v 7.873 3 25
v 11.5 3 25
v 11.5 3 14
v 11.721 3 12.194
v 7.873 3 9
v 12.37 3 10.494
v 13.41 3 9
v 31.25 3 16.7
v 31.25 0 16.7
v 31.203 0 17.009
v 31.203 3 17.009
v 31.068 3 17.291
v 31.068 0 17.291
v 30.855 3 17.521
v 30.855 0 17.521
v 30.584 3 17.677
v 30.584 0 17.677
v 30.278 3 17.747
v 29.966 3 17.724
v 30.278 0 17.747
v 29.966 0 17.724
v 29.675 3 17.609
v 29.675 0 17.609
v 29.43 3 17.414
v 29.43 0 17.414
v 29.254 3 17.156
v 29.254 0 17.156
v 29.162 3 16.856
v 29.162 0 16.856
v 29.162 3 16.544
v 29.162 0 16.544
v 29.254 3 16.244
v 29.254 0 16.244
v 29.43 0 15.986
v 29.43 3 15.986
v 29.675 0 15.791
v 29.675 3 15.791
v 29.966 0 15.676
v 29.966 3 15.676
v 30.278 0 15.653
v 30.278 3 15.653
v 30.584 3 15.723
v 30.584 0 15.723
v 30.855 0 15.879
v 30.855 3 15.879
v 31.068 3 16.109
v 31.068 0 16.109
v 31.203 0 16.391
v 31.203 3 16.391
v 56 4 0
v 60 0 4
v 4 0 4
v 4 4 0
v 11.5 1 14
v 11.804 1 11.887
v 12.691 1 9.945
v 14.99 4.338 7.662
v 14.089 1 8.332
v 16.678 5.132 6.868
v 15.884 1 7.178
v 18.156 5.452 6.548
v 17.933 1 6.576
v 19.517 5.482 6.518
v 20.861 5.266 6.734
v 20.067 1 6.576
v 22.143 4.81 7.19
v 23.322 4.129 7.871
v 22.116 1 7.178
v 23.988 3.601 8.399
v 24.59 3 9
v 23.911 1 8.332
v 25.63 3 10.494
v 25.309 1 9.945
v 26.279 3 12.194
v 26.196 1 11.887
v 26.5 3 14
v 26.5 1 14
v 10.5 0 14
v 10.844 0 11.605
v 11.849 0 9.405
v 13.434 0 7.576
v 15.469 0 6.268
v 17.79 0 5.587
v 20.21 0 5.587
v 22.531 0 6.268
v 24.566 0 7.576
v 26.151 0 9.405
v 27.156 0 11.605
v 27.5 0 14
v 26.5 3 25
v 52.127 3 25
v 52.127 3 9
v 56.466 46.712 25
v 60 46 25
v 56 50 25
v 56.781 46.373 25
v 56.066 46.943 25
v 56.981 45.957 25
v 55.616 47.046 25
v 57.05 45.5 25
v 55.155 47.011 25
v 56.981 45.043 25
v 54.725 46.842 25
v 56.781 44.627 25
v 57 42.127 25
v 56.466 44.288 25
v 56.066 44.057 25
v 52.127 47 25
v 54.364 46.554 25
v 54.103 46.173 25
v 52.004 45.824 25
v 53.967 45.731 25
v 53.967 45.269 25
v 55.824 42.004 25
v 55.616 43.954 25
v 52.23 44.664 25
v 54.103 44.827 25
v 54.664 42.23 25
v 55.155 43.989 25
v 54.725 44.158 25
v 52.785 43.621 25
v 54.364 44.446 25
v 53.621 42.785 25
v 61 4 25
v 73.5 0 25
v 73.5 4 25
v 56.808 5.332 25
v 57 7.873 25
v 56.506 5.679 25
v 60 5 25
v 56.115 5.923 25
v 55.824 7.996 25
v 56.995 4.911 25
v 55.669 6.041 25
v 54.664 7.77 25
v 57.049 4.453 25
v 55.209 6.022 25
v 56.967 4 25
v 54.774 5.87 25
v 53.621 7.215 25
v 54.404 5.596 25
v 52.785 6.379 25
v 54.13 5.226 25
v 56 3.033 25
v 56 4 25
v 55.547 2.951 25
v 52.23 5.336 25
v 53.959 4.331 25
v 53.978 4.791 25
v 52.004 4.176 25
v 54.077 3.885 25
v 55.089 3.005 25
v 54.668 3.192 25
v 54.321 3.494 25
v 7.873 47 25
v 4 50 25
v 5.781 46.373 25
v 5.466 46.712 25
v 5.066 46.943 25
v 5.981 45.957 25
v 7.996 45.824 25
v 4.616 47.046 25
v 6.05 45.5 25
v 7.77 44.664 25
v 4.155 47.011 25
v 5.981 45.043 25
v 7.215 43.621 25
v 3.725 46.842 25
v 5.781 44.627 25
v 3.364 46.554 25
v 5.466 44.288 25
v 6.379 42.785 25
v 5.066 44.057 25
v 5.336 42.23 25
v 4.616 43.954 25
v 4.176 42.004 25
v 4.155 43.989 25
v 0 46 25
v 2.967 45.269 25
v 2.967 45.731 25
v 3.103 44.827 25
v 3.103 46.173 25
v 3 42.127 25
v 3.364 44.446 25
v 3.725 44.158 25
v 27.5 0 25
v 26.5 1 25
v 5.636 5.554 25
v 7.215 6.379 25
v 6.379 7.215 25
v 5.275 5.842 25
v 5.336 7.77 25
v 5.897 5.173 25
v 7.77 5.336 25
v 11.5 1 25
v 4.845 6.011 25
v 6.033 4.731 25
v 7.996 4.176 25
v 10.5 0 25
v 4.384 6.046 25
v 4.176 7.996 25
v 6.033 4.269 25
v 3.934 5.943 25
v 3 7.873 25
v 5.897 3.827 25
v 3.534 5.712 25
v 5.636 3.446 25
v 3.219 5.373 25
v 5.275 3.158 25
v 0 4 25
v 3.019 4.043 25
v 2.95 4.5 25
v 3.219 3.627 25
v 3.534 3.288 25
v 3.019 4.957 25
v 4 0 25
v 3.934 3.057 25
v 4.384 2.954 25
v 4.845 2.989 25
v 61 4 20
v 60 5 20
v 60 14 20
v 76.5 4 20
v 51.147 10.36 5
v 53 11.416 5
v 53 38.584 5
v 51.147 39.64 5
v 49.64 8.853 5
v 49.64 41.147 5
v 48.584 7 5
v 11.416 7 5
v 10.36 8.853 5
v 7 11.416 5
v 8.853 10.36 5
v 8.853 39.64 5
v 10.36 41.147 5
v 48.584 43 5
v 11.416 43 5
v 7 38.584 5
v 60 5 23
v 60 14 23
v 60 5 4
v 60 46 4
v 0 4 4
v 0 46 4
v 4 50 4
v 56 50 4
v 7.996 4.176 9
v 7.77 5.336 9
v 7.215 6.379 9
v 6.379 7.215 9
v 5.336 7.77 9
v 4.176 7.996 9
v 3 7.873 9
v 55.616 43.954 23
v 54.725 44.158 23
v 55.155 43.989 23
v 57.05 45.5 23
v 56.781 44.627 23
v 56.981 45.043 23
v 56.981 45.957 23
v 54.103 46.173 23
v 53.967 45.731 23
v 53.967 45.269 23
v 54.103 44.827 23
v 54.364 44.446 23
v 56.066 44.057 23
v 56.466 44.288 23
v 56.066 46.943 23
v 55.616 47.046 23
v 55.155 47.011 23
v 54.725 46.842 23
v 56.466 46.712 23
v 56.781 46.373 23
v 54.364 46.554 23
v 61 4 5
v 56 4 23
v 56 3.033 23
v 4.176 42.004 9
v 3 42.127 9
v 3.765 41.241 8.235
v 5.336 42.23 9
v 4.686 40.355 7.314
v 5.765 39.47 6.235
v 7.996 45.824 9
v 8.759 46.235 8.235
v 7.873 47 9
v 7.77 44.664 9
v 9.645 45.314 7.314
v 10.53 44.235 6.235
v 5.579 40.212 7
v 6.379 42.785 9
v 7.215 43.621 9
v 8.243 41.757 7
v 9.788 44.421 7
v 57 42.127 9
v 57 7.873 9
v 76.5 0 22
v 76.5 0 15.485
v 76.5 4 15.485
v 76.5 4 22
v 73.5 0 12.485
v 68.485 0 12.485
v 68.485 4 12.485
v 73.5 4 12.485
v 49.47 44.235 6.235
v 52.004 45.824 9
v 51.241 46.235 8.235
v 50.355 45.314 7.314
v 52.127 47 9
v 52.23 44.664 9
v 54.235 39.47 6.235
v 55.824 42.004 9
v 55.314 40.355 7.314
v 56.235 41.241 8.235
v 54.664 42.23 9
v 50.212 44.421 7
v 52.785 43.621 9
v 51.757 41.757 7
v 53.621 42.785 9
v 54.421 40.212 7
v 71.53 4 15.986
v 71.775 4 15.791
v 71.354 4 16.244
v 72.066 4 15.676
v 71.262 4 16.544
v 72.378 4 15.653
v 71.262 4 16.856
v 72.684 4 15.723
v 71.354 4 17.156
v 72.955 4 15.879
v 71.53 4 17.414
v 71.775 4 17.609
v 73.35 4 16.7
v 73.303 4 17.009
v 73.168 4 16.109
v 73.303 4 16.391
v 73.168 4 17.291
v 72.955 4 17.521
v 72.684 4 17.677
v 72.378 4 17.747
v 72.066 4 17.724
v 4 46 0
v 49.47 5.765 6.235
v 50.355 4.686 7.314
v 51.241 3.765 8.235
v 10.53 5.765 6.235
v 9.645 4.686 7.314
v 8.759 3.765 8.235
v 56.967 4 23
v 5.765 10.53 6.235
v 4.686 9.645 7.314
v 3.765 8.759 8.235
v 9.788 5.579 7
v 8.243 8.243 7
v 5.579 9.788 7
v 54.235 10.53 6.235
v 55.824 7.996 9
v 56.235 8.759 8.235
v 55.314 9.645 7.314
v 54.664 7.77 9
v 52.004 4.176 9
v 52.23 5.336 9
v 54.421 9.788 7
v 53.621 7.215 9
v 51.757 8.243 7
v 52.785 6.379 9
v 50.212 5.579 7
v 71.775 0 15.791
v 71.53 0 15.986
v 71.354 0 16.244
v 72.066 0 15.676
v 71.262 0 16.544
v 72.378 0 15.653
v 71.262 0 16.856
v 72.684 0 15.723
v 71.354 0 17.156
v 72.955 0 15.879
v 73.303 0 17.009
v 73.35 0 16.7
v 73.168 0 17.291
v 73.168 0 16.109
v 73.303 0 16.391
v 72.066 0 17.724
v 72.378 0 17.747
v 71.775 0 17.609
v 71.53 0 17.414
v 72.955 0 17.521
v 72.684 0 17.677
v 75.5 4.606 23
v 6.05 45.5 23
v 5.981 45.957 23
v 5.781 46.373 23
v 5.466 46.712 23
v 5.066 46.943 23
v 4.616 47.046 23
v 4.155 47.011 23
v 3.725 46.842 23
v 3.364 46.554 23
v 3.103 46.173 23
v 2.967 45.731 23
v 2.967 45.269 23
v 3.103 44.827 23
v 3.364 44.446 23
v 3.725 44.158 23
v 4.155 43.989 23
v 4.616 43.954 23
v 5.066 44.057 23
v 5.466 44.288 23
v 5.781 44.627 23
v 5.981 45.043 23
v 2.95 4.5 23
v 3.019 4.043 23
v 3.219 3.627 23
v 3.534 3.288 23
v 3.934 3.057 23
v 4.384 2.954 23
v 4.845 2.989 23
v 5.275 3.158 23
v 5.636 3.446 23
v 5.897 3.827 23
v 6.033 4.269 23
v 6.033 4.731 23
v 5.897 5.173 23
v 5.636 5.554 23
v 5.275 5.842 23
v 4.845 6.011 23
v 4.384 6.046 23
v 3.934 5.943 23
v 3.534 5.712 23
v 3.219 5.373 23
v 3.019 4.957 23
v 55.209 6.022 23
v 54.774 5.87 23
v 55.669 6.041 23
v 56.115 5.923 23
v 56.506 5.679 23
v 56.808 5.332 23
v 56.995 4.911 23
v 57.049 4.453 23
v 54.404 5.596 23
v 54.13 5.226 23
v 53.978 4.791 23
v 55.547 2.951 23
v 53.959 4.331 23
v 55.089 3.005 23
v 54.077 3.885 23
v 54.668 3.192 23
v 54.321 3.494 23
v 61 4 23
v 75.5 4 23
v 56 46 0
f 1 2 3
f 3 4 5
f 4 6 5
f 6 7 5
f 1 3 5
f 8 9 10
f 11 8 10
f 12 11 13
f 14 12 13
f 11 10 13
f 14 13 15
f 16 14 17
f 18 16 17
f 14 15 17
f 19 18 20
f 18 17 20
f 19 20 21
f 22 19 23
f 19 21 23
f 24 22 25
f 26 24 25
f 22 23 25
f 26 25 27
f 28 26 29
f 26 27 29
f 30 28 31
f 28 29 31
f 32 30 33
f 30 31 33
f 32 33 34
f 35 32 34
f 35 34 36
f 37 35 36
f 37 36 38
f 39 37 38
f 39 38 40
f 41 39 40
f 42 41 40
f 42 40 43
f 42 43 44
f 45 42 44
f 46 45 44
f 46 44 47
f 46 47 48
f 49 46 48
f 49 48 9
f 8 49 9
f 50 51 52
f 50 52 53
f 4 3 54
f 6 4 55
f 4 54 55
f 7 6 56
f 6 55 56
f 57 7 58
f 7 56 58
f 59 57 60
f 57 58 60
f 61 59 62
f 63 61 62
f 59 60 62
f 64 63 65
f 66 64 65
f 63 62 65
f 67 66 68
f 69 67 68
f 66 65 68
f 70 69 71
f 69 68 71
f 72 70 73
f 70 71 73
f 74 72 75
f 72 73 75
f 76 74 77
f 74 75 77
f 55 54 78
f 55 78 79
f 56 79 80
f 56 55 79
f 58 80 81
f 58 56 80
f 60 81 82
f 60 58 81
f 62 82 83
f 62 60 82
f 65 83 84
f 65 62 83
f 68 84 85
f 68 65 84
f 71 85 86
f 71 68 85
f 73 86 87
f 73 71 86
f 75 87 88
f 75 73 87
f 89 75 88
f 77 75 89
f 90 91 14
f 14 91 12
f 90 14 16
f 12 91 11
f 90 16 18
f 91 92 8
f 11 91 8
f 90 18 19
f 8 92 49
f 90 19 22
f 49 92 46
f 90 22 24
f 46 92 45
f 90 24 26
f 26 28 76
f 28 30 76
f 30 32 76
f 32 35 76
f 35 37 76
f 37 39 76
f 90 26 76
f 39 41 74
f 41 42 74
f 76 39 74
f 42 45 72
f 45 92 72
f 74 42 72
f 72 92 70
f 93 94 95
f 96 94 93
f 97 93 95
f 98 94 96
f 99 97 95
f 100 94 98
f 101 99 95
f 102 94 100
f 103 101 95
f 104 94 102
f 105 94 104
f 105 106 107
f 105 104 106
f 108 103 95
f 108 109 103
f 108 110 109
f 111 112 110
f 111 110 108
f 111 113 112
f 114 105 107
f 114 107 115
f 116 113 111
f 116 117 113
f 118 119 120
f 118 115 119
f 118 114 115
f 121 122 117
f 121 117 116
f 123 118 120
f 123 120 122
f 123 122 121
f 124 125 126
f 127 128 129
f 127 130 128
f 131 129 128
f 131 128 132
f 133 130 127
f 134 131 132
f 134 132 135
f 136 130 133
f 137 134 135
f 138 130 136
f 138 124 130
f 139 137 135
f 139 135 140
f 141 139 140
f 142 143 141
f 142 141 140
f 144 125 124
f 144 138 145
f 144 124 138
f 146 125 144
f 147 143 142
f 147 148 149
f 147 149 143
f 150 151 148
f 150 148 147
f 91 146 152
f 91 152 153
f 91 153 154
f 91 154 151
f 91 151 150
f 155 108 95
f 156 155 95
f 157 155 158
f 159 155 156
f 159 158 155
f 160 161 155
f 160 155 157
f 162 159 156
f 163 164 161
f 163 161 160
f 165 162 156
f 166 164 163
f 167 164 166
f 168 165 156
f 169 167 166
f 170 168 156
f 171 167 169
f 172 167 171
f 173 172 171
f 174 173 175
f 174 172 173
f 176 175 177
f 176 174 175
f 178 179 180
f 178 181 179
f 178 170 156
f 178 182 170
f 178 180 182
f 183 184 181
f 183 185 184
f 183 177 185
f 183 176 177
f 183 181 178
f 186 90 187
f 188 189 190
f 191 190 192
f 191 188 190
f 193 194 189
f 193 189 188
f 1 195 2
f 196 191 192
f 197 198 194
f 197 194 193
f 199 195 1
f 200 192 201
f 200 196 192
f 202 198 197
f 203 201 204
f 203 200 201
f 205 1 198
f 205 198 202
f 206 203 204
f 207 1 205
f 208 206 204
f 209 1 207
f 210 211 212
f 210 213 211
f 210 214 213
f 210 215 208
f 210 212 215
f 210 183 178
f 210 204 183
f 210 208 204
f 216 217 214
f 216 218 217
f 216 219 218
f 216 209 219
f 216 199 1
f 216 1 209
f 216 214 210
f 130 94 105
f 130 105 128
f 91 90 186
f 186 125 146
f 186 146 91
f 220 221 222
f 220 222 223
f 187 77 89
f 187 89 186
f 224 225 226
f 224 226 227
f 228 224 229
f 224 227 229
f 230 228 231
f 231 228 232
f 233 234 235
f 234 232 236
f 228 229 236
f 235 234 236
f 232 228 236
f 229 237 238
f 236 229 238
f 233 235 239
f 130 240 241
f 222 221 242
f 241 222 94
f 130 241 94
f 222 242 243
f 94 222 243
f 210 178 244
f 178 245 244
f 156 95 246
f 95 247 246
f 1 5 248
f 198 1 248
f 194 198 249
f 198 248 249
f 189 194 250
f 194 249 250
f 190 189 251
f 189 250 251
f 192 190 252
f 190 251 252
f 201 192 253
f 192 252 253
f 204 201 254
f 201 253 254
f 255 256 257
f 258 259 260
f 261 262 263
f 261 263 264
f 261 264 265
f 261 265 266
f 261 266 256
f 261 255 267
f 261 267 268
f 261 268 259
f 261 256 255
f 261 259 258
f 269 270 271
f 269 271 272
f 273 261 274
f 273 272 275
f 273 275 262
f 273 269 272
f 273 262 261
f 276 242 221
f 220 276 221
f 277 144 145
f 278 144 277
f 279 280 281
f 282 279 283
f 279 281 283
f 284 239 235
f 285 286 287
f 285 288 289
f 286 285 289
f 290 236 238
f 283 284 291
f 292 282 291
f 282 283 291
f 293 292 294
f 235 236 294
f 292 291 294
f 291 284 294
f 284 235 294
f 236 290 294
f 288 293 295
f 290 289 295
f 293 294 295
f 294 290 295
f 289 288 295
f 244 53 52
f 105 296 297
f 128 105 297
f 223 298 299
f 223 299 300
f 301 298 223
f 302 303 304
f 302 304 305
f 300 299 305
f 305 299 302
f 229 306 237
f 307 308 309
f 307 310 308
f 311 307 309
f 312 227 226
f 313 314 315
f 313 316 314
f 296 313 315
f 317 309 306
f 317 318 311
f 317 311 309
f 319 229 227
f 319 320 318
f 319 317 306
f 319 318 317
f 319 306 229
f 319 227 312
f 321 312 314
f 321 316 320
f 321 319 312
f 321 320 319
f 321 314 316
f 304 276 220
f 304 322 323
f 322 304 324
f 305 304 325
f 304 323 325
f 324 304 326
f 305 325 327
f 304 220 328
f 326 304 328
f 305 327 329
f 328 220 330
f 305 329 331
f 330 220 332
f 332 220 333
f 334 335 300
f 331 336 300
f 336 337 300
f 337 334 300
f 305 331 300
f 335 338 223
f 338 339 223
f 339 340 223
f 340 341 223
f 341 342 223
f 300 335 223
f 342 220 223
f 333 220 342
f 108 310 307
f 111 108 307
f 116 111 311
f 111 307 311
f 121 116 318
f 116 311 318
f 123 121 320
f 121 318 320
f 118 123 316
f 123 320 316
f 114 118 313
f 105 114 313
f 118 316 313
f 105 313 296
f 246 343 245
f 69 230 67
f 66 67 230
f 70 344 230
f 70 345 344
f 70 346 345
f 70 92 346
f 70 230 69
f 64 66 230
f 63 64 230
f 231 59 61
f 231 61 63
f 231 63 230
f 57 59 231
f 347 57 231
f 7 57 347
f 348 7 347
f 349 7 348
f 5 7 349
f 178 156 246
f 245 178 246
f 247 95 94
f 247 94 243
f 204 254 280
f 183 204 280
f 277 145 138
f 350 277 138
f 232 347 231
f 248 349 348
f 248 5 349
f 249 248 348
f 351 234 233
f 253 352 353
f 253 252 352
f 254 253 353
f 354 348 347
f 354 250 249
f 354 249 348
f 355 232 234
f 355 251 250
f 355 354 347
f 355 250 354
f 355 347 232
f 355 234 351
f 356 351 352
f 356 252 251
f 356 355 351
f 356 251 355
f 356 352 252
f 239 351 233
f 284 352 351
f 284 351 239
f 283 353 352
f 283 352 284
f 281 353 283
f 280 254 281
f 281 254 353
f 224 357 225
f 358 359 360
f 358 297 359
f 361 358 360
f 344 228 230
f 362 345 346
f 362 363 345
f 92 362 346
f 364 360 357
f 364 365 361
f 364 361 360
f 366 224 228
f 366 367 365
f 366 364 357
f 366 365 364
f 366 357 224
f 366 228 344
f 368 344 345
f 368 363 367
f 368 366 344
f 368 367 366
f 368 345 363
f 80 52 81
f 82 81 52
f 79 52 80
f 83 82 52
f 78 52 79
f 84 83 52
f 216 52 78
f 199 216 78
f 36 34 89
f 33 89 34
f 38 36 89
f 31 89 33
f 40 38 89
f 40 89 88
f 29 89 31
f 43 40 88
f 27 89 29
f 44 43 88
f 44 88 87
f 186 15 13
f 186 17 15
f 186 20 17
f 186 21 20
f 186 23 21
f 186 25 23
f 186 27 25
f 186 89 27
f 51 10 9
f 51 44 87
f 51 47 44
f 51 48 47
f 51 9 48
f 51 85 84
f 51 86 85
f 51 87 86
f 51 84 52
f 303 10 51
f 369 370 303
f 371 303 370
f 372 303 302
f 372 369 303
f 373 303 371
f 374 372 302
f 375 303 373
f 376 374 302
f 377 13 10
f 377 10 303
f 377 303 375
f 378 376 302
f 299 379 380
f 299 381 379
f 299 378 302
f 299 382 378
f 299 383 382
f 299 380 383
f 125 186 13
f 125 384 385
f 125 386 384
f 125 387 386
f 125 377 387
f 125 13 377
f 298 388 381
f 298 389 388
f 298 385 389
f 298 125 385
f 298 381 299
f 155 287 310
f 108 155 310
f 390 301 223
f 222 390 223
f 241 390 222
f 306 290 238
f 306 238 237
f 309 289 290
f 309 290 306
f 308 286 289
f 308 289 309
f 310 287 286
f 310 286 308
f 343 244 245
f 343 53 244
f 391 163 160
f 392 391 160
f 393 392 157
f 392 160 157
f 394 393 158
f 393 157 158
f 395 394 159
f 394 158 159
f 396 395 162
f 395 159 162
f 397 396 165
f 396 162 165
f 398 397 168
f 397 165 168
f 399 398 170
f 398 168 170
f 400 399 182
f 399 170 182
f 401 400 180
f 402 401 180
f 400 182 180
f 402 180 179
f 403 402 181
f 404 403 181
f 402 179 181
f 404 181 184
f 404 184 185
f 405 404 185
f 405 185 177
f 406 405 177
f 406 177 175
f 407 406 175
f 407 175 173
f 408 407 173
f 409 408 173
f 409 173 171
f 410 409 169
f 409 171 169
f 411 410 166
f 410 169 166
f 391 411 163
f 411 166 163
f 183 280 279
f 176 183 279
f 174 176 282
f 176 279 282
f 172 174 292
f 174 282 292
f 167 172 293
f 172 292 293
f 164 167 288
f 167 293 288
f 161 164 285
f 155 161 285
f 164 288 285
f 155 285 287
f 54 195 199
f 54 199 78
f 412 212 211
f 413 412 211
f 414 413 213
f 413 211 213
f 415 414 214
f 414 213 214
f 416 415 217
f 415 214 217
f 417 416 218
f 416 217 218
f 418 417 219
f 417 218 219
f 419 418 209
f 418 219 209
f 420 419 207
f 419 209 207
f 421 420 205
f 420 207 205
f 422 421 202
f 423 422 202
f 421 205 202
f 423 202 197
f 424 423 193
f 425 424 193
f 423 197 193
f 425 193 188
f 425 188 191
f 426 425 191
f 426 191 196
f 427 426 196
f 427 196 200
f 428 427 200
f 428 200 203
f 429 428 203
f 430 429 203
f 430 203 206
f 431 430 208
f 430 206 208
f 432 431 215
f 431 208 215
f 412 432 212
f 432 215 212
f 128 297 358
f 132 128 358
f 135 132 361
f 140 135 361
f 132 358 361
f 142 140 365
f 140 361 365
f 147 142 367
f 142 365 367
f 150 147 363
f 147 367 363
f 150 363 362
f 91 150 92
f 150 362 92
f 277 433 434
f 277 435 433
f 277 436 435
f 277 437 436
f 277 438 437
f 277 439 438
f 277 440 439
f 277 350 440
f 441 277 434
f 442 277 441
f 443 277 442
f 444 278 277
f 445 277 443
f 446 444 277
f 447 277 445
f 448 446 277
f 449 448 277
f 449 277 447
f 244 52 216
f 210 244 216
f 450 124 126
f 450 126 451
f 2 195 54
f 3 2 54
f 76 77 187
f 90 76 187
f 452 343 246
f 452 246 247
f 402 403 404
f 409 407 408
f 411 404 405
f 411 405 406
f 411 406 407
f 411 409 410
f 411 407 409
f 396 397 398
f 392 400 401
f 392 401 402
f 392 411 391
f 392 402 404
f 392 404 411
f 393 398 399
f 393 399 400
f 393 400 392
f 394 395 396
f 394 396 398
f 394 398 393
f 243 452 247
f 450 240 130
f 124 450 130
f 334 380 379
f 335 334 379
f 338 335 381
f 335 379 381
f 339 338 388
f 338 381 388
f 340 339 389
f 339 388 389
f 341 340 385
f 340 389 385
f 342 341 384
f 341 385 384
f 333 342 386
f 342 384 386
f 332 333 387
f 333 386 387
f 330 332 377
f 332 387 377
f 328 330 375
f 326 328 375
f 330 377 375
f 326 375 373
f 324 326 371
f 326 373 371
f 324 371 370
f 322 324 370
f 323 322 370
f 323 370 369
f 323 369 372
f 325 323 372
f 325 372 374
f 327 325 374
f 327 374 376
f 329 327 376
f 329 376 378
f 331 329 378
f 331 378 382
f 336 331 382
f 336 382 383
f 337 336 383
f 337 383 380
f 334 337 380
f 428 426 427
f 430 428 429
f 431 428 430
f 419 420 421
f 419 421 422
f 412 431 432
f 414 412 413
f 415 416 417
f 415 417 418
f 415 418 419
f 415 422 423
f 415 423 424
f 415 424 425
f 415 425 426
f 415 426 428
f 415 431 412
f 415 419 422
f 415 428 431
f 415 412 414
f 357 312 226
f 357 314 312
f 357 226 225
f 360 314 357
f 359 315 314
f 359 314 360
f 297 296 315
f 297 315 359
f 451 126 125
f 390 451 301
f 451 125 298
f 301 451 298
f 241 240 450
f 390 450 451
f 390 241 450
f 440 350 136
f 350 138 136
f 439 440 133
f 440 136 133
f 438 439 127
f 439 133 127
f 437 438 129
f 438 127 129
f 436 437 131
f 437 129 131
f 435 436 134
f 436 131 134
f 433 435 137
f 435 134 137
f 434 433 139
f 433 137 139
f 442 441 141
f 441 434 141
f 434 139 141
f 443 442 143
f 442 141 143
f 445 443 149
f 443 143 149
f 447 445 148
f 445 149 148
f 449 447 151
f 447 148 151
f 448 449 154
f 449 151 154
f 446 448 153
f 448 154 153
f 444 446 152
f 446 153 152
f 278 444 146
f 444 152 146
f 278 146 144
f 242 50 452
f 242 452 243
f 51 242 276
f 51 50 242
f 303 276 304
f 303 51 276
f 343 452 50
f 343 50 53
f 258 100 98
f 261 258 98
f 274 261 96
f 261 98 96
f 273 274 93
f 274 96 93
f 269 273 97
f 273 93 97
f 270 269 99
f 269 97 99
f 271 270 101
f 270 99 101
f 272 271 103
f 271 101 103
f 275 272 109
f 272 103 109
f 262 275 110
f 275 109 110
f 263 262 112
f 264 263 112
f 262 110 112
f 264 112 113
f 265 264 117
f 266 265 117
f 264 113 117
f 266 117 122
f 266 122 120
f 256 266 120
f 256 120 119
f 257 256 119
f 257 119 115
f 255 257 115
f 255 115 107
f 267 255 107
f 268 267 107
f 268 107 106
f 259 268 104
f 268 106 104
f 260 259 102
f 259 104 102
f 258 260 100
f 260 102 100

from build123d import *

# Parameters (mm, degrees)
BOSS_EXTRUDE1_DEPTH = 5
BOSS_EXTRUDE2_DEPTH = 20
CHAMFER1_SIZE       = 4
CHAMFER2_SIZE       = 4
CUT_EXTRUDE1_REACH  = 84.006
SKETCH3_R           = 7.5
SKETCH5_R           = 1.550000000000001
SKETCH5_R_2         = 1.5500000000000018
SKETCH5_R_3         = 1.5500000000000012
SKETCH5_R_4         = 1.5500000000000003
CUT_EXTRUDE2_DEPTH  = 2
CHAMFER3_SIZE       = 1
BOSS_EXTRUDE3_DEPTH = 4
CUT_EXTRUDE3_REACH  = 81.126
CUT_EXTRUDE5_REACH  = 96.748
SKETCH10_R          = 1.050000000000002
SKETCH10_R_2        = 1.0499999999999956
BOSS_EXTRUDE5_DEPTH = 3
CHAMFER6_SIZE       = 1
CHAMFER7_SIZE       = 3


with BuildPart() as part:
    # Sketch1 → Boss-Extrude1 (new body)
    with BuildSketch(Plane.XY):
        Polygon((0, 0), (3.28e-15, 50), (60, 50), (60, -1.4e-16), align=None)
    extrude(amount=BOSS_EXTRUDE1_DEPTH)

    # Sketch2 → Boss-Extrude2 (add)
    with BuildSketch(Plane.XY.offset(5)):
        with BuildLine():
            Line((7.872983346207448, 47), (52.127016653792545, 47))
            ThreePointArc((52.12701665379256, 46.99999999999996), (53.55051025721673, 49.16227766016832), (55.99999999999984, 50.00000000000001))
            Line((55.99999999999984, 50), (3.9999999999998224, 50))
            ThreePointArc((3.999999999999821, 50), (6.449489742783131, 49.16227766016842), (7.872983346207436, 46.99999999999996))
        make_face()
        with BuildLine():
            ThreePointArc((0, 46), (1.1715728752537458, 48.82842712474613), (3.999999999999821, 50))
            Line((3.9999999999998224, 50), (0, 50))
            Line((3.28e-15, 50), (3.02e-15, 46))
        make_face()
        with BuildLine():
            ThreePointArc((8.000000000000007, 46), (7.968118785068677, 46.50401716993089), (7.872983346207436, 46.99999999999996))
            Line((7.872983346207448, 47), (3.000000000000007, 47))
            Line((3.0000000000000036, 47), (3.000000000000003, 42.12701665379265))
            ThreePointArc((2.999999999999857, 42.127016653792616), (6.4494897427831255, 42.83772233983157), (8.000000000000007, 46))
        make_face()
        with BuildLine():
            Line((3.000000000000007, 47), (7.872983346207448, 47))
            ThreePointArc((7.872983346207436, 46.99999999999996), (6.449489742783131, 49.16227766016842), (3.999999999999821, 50))
            ThreePointArc((3.999999999999821, 50), (1.1715728752537458, 48.82842712474613), (0, 46))
            ThreePointArc((0, 46), (0.8377223398315752, 43.55051025721688), (2.999999999999857, 42.127016653792616))
            Line((3.000000000000003, 42.12701665379265), (3.0000000000000036, 47))
        make_face()
        with BuildLine():
            ThreePointArc((-1.78e-15, 3.9999999936735127), (0.8377223378945806, 6.449489740282477), (3.0000000000001434, 7.8729833462074605))
            Line((3.000000000000001, 7.872983346207491), (3.000000000000003, 42.12701665379265))
            ThreePointArc((2.999999999999857, 42.127016653792616), (0.8377223398315752, 43.55051025721688), (0, 46))
            Line((3.02e-15, 46), (2.6e-16, 3.999999993673512))
        make_face()
        with BuildLine():
            ThreePointArc((8.000000000000007, 46), (7.968118785068677, 46.50401716993089), (7.872983346207436, 46.99999999999996))
            Line((7.872983346207448, 47), (3.000000000000007, 47))
            Line((3.0000000000000036, 47), (3.000000000000003, 42.12701665379265))
            ThreePointArc((2.999999999999857, 42.127016653792616), (6.4494897427831255, 42.83772233983157), (8.000000000000007, 46))
        make_face()
        with BuildLine():
            Line((3.000000000000007, 47), (7.872983346207448, 47))
            ThreePointArc((7.872983346207436, 46.99999999999996), (6.449489742783131, 49.16227766016842), (3.999999999999821, 50))
            ThreePointArc((3.999999999999821, 50), (1.1715728752537458, 48.82842712474613), (0, 46))
            ThreePointArc((0, 46), (0.8377223398315752, 43.55051025721688), (2.999999999999857, 42.127016653792616))
            Line((3.000000000000003, 42.12701665379265), (3.0000000000000036, 47))
        make_face()
        with BuildLine():
            ThreePointArc((3.999999999999755, 8.9e-16), (6.449489742783102, 0.8377223398315614), (7.872983346207432, 3.0000000000000497))
            Line((7.8729833462074446, 3), (3.0000000000000004, 3))
            Line((3.0000000000000004, 3), (3.000000000000001, 7.872983346207491))
            ThreePointArc((3.0000000000001434, 7.8729833462074605), (0.8377223378945806, 6.449489740282477), (-1.78e-15, 3.9999999936735127))
            ThreePointArc((-1.78e-15, 3.9999999936735127), (1.1715728774904743, 1.1715728730171464), (3.999999999999755, 8.9e-16))
        make_face()
        with BuildLine():
            Line((3.0000000000000004, 3), (7.8729833462074446, 3))
            ThreePointArc((7.872983346207432, 3.0000000000000497), (7.968118785068674, 3.4959828300691127), (8.000000000000004, 4.000000000000003))
            ThreePointArc((8.000000000000004, 4.0000000000000036), (6.449489742783239, 7.16227766016834), (3.0000000000001434, 7.8729833462074605))
            Line((3.000000000000001, 7.872983346207491), (3.0000000000000004, 3))
        make_face()
        with BuildLine():
            Line((0, 0), (3.999999999999755, -1e-17))
            ThreePointArc((3.999999999999755, 8.9e-16), (1.1715728774904743, 1.1715728730171464), (-1.78e-15, 3.9999999936735127))
            Line((2.6e-16, 3.999999993673512), (0, 0))
        make_face()
        with BuildLine():
            ThreePointArc((55.99999999999975, -1.066e-14), (53.55051025721669, 0.8377223398317017), (52.12701665379255, 3.0000000000000497))
            Line((52.12701665379255, 3), (7.8729833462074446, 3))
            ThreePointArc((7.872983346207432, 3.0000000000000497), (6.449489742783102, 0.8377223398315614), (3.999999999999755, 8.9e-16))
            Line((3.999999999999755, -1e-17), (55.99999999999976, -1.3e-16))
        make_face()
        with BuildLine():
            ThreePointArc((3.999999999999755, 8.9e-16), (6.449489742783102, 0.8377223398315614), (7.872983346207432, 3.0000000000000497))
            Line((7.8729833462074446, 3), (3.0000000000000004, 3))
            Line((3.0000000000000004, 3), (3.000000000000001, 7.872983346207491))
            ThreePointArc((3.0000000000001434, 7.8729833462074605), (0.8377223378945806, 6.449489740282477), (-1.78e-15, 3.9999999936735127))
            ThreePointArc((-1.78e-15, 3.9999999936735127), (1.1715728774904743, 1.1715728730171464), (3.999999999999755, 8.9e-16))
        make_face()
        with BuildLine():
            Line((3.0000000000000004, 3), (7.8729833462074446, 3))
            ThreePointArc((7.872983346207432, 3.0000000000000497), (7.968118785068674, 3.4959828300691127), (8.000000000000004, 4.000000000000003))
            ThreePointArc((8.000000000000004, 4.0000000000000036), (6.449489742783239, 7.16227766016834), (3.0000000000001434, 7.8729833462074605))
            Line((3.000000000000001, 7.872983346207491), (3.0000000000000004, 3))
        make_face()
        with BuildLine():
            Line((52.127016653792545, 3), (56.99999999999999, 3))
            Line((56.99999999999999, 3), (56.99999999999999, 7.872983346207451))
            ThreePointArc((56.99999999999993, 7.872983346207436), (53.171572875253794, 6.828427124746189), (52.12701665379255, 3.0000000000000497))
        make_face()
        with BuildLine():
            Line((56.99999999999999, 7.872983346207451), (56.99999999999999, 3))
            Line((56.99999999999999, 3), (52.127016653792545, 3))
            ThreePointArc((52.12701665379255, 3.0000000000000497), (53.55051025721669, 0.8377223398317017), (55.99999999999975, -1.066e-14))
            ThreePointArc((55.99999999999975, -1.066e-14), (58.8284271247461, 1.1715728752537156), (60, 3.9999999999999956))
            ThreePointArc((60, 3.9999999999999964), (59.16227766016836, 6.4494897427832045), (56.99999999999993, 7.872983346207436))
        make_face()
        with BuildLine():
            Line((60, -1.4e-16), (60, 3.9999999999999964))
            ThreePointArc((60, 3.9999999999999956), (58.8284271247461, 1.1715728752537156), (55.99999999999975, -1.066e-14))
            Line((55.99999999999975, -1.3e-16), (60, -1.4e-16))
        make_face()
        with BuildLine():
            Line((52.127016653792545, 3), (56.99999999999999, 3))
            Line((56.99999999999999, 3), (56.99999999999999, 7.872983346207451))
            ThreePointArc((56.99999999999993, 7.872983346207436), (53.171572875253794, 6.828427124746189), (52.12701665379255, 3.0000000000000497))
        make_face()
        with BuildLine():
            Line((56.99999999999999, 7.872983346207451), (56.99999999999999, 3))
            Line((56.99999999999999, 3), (52.127016653792545, 3))
            ThreePointArc((52.12701665379255, 3.0000000000000497), (53.55051025721669, 0.8377223398317017), (55.99999999999975, -1.066e-14))
            ThreePointArc((55.99999999999975, -1.066e-14), (58.8284271247461, 1.1715728752537156), (60, 3.9999999999999956))
            ThreePointArc((60, 3.9999999999999964), (59.16227766016836, 6.4494897427832045), (56.99999999999993, 7.872983346207436))
        make_face()
        with BuildLine():
            Line((56.99999999999999, 42.127016653792545), (56.99999999999999, 7.872983346207451))
            ThreePointArc((56.99999999999993, 7.872983346207436), (59.16227766016836, 6.4494897427832045), (60, 3.9999999999999964))
            Line((60, 3.9999999999999964), (60, 46))
            ThreePointArc((60, 46), (59.16227766016836, 43.55051025721679), (56.99999999999993, 42.12701665379256))
        make_face()
        with BuildLine():
            ThreePointArc((55.99999999999984, 50.00000000000001), (58.828427124746135, 48.82842712474625), (60, 46))
            Line((60, 46), (60, 50))
            Line((60, 50), (55.99999999999984, 50))
        make_face()
        with BuildLine():
            ThreePointArc((52.12701665379256, 46.99999999999996), (53.171572875253794, 43.171572875253815), (56.99999999999993, 42.12701665379256))
            Line((56.99999999999999, 42.127016653792545), (56.99999999999999, 47))
            Line((56.99999999999999, 47), (52.127016653792545, 47))
        make_face()
        with BuildLine():
            Line((56.99999999999999, 47), (56.99999999999999, 42.127016653792545))
            ThreePointArc((56.99999999999993, 42.12701665379256), (59.16227766016836, 43.55051025721679), (60, 46))
            ThreePointArc((60, 46), (58.828427124746135, 48.82842712474625), (55.99999999999984, 50.00000000000001))
            ThreePointArc((55.99999999999984, 50.00000000000001), (53.55051025721673, 49.16227766016832), (52.12701665379256, 46.99999999999996))
            Line((52.127016653792545, 47), (56.99999999999999, 47))
        make_face()
        with BuildLine():
            ThreePointArc((52.12701665379256, 46.99999999999996), (53.171572875253794, 43.171572875253815), (56.99999999999993, 42.12701665379256))
            Line((56.99999999999999, 42.127016653792545), (56.99999999999999, 47))
            Line((56.99999999999999, 47), (52.127016653792545, 47))
        make_face()
        with BuildLine():
            Line((56.99999999999999, 47), (56.99999999999999, 42.127016653792545))
            ThreePointArc((56.99999999999993, 42.12701665379256), (59.16227766016836, 43.55051025721679), (60, 46))
            ThreePointArc((60, 46), (58.828427124746135, 48.82842712474625), (55.99999999999984, 50.00000000000001))
            ThreePointArc((55.99999999999984, 50.00000000000001), (53.55051025721673, 49.16227766016832), (52.12701665379256, 46.99999999999996))
            Line((52.127016653792545, 47), (56.99999999999999, 47))
        make_face()
    extrude(amount=BOSS_EXTRUDE2_DEPTH)

    # Chamfer1
    chamfer1_edges = [part.edges().sort_by_distance(p)[0] for p in [
        (6.828427124746156, 43.171572875253766, 5),
        (53.171572875253794, 43.171572875253815, 5),
        (53.171572875253794, 6.828427124746188, 5),
        (56.99999999999999, 24.999999999999996, 5),
        (29.999999999999996, 47, 5),
        (2.999999999999961, 25.000000000000057, 5),
        (6.828427124746214, 6.828427124746155, 5),
        (30, 3, 5),
    ]]
    chamfer(chamfer1_edges, length=CHAMFER1_SIZE)

    # Chamfer2
    chamfer2_edges = [part.edges().sort_by_distance(p)[0] for p in [
        (1.64e-15, 25, 0),
        (30.000000000000004, 50, 0),
        (60, 25, 0),
        (30, -7e-17, 0),
        (0, 0, 12.5),
        (2.46e-15, 50, 12.5),
        (60, 50, 12.5),
        (60, -1.4e-16, 12.5),
    ]]
    chamfer(chamfer2_edges, length=CHAMFER2_SIZE)

    # Sketch3 → Cut-Extrude1 (cut, up to next)
    with BuildSketch(Plane.XZ, mode=Mode.PRIVATE) as cut_extrude1_sk1:
        with BuildLine():
            Line((11.499999999999982, 25), (11.499999999999982, 14.000000000000004))
            ThreePointArc((11.499999999999982, 14.000000000000007), (18.999999999999986, 21.500000000000004), (26.499999999999982, 14.000000000000004))
            Line((26.499999999999982, 14.000000000000004), (26.499999999999982, 25))
            Line((26.499999999999982, 25), (11.499999999999982, 25))
        make_face()
    cut_extrude1_tool1 = extrude(cut_extrude1_sk1.sketch, amount=-CUT_EXTRUDE1_REACH, mode=Mode.PRIVATE) & part.part
    # Sketch3 → Cut-Extrude1 (cut, up to next)
    with BuildSketch(Plane.XZ, mode=Mode.PRIVATE) as cut_extrude1_sk2:
        with Locations((18.999999999999982, 14.000000000000004)):
            Circle(SKETCH3_R)
    cut_extrude1_tool2 = extrude(cut_extrude1_sk2.sketch, amount=-CUT_EXTRUDE1_REACH, mode=Mode.PRIVATE) & part.part
    add(cut_extrude1_tool1.solids().sort_by_distance((19, 0, 22.171032))[0], mode=Mode.SUBTRACT)
    add(cut_extrude1_tool2.solids().sort_by_distance((19, 0, 14))[0], mode=Mode.SUBTRACT)

    # Sketch5 → Cut-Extrude2 (cut)
    with BuildSketch(Plane.XY.offset(25)):
        with Locations((4.5, 45.50000000000001)):
            Circle(SKETCH5_R)
        with Locations((55.5, 45.50000000000001)):
            Circle(SKETCH5_R_2)
        with Locations(Location((55.5, 4.49999999999999, 0), (0, 0, 180))):
            Circle(SKETCH5_R_3)
        with Locations(Location((4.499999999999998, 4.499999999999997, 0), (0, 0, 180))):
            Circle(SKETCH5_R_4)
    extrude(amount=-CUT_EXTRUDE2_DEPTH, mode=Mode.SUBTRACT)

    # Chamfer3
    chamfer3_edges = [part.edges().sort_by_distance(p)[0] for p in [
        (18.999999999999982, -4e-17, 6.5000000000000036),
        (26.499999999999982, -6e-17, 19.5),
        (11.499999999999982, -3e-17, 19.5),
    ]]
    chamfer(chamfer3_edges, length=CHAMFER3_SIZE)

    # Sketch6 → Boss-Extrude3 (add)
    with BuildSketch(Plane.XZ):
        Polygon((76.49999999999997, 25), (56.00000000000001, 25), (55.99999999999999, 0), (68.4852813742386, 12.48528137423854), (76.49999999999997, 12.48528137423853), align=None)
    extrude(amount=-BOSS_EXTRUDE3_DEPTH)

    # Sketch7 → Cut-Extrude3 (cut, up to next)
    with BuildSketch(Plane.ZY.offset(-56.000000000000014), mode=Mode.PRIVATE) as cut_extrude3_sk1:
        Polygon((3.9999999999999827, 6e-17), (0, 4.0000000000000036), (6.94e-15, 0), align=None)
    cut_extrude3_tool1 = extrude(cut_extrude3_sk1.sketch, amount=-CUT_EXTRUDE3_REACH, mode=Mode.PRIVATE) & part.part
    add(cut_extrude3_tool1.solids().sort_by_distance((56, 1.333333, 1.333333))[0], mode=Mode.SUBTRACT)

    # Sketch10 → Cut-Extrude5 (cut, up to next)
    with BuildSketch(Plane.XZ, mode=Mode.PRIVATE) as cut_extrude5_sk1:
        with Locations((72.29999999999998, 16.70000000000001)):
            Circle(SKETCH10_R)
    cut_extrude5_tool1 = extrude(cut_extrude5_sk1.sketch, amount=-CUT_EXTRUDE5_REACH, mode=Mode.PRIVATE) & part.part
    # Sketch10 → Cut-Extrude5 (cut, up to next)
    with BuildSketch(Plane.XZ, mode=Mode.PRIVATE) as cut_extrude5_sk2:
        with Locations((30.199999999999992, 16.700000000000024)):
            Circle(SKETCH10_R_2)
    cut_extrude5_tool2 = extrude(cut_extrude5_sk2.sketch, amount=-CUT_EXTRUDE5_REACH, mode=Mode.PRIVATE) & part.part
    add(cut_extrude5_tool1.solids().sort_by_distance((72.3, 0, 16.7))[0], mode=Mode.SUBTRACT)
    add(cut_extrude5_tool2.solids().sort_by_distance((30.2, 0, 16.7))[0], mode=Mode.SUBTRACT)

    # Sketch11 → Boss-Extrude5 (add)
    with BuildSketch(Plane.XY.offset(23)):
        Polygon((76.49999999999997, 3), (76.49999999999997, 4), (59.99999999999999, 4), (59.99999999999999, 14), (58.99999999999999, 14), (58.99999999999999, 3), align=None)
        Polygon((59.99999999999999, 4), (76.49999999999997, 4), (59.99999999999999, 14), align=None)
    extrude(amount=-BOSS_EXTRUDE5_DEPTH)

    # Chamfer6
    chamfer6_edges = [part.edges().sort_by_distance(p)[0] for p in [
        (60, 4, 12),
        (60, 4, 24),
    ]]
    chamfer(chamfer6_edges, length=CHAMFER6_SIZE)

    # Chamfer7
    # the kernel refuses this chamfer: 3 mm, written as the material it takes off along each edge
    with BuildSketch(Plane(origin=(76.49999999999997, -7.715048963897736, 25), x_dir=(-0.9996219169112965, 0, 0.02749587661058676), z_dir=(0, 1, 0))) as chamfer7_piece_1:
        Polygon((CHAMFER7_SIZE * 0.999621916911, -CHAMFER7_SIZE * 0.0274958766106), (-CHAMFER7_SIZE * 0.0274958766106, -CHAMFER7_SIZE * 0.999621916911), (0, 0), align=None)
    extrude(amount=19.430097927795472, mode=Mode.SUBTRACT)
    with BuildSketch(Plane(origin=(76.49999999999997, -7.715048963897734, 12.48528137423853), x_dir=(0.02749587661058678, 0, 0.9996219169112968), z_dir=(0, 1, 0))) as chamfer7_piece_2:
        Polygon((CHAMFER7_SIZE * 0.999621916911, -CHAMFER7_SIZE * 0.0274958766106), (-CHAMFER7_SIZE * 0.0274958766106, -CHAMFER7_SIZE * 0.999621916911), (0, 0), align=None)
    extrude(amount=19.43009792779547, mode=Mode.SUBTRACT)


solid = part.part
